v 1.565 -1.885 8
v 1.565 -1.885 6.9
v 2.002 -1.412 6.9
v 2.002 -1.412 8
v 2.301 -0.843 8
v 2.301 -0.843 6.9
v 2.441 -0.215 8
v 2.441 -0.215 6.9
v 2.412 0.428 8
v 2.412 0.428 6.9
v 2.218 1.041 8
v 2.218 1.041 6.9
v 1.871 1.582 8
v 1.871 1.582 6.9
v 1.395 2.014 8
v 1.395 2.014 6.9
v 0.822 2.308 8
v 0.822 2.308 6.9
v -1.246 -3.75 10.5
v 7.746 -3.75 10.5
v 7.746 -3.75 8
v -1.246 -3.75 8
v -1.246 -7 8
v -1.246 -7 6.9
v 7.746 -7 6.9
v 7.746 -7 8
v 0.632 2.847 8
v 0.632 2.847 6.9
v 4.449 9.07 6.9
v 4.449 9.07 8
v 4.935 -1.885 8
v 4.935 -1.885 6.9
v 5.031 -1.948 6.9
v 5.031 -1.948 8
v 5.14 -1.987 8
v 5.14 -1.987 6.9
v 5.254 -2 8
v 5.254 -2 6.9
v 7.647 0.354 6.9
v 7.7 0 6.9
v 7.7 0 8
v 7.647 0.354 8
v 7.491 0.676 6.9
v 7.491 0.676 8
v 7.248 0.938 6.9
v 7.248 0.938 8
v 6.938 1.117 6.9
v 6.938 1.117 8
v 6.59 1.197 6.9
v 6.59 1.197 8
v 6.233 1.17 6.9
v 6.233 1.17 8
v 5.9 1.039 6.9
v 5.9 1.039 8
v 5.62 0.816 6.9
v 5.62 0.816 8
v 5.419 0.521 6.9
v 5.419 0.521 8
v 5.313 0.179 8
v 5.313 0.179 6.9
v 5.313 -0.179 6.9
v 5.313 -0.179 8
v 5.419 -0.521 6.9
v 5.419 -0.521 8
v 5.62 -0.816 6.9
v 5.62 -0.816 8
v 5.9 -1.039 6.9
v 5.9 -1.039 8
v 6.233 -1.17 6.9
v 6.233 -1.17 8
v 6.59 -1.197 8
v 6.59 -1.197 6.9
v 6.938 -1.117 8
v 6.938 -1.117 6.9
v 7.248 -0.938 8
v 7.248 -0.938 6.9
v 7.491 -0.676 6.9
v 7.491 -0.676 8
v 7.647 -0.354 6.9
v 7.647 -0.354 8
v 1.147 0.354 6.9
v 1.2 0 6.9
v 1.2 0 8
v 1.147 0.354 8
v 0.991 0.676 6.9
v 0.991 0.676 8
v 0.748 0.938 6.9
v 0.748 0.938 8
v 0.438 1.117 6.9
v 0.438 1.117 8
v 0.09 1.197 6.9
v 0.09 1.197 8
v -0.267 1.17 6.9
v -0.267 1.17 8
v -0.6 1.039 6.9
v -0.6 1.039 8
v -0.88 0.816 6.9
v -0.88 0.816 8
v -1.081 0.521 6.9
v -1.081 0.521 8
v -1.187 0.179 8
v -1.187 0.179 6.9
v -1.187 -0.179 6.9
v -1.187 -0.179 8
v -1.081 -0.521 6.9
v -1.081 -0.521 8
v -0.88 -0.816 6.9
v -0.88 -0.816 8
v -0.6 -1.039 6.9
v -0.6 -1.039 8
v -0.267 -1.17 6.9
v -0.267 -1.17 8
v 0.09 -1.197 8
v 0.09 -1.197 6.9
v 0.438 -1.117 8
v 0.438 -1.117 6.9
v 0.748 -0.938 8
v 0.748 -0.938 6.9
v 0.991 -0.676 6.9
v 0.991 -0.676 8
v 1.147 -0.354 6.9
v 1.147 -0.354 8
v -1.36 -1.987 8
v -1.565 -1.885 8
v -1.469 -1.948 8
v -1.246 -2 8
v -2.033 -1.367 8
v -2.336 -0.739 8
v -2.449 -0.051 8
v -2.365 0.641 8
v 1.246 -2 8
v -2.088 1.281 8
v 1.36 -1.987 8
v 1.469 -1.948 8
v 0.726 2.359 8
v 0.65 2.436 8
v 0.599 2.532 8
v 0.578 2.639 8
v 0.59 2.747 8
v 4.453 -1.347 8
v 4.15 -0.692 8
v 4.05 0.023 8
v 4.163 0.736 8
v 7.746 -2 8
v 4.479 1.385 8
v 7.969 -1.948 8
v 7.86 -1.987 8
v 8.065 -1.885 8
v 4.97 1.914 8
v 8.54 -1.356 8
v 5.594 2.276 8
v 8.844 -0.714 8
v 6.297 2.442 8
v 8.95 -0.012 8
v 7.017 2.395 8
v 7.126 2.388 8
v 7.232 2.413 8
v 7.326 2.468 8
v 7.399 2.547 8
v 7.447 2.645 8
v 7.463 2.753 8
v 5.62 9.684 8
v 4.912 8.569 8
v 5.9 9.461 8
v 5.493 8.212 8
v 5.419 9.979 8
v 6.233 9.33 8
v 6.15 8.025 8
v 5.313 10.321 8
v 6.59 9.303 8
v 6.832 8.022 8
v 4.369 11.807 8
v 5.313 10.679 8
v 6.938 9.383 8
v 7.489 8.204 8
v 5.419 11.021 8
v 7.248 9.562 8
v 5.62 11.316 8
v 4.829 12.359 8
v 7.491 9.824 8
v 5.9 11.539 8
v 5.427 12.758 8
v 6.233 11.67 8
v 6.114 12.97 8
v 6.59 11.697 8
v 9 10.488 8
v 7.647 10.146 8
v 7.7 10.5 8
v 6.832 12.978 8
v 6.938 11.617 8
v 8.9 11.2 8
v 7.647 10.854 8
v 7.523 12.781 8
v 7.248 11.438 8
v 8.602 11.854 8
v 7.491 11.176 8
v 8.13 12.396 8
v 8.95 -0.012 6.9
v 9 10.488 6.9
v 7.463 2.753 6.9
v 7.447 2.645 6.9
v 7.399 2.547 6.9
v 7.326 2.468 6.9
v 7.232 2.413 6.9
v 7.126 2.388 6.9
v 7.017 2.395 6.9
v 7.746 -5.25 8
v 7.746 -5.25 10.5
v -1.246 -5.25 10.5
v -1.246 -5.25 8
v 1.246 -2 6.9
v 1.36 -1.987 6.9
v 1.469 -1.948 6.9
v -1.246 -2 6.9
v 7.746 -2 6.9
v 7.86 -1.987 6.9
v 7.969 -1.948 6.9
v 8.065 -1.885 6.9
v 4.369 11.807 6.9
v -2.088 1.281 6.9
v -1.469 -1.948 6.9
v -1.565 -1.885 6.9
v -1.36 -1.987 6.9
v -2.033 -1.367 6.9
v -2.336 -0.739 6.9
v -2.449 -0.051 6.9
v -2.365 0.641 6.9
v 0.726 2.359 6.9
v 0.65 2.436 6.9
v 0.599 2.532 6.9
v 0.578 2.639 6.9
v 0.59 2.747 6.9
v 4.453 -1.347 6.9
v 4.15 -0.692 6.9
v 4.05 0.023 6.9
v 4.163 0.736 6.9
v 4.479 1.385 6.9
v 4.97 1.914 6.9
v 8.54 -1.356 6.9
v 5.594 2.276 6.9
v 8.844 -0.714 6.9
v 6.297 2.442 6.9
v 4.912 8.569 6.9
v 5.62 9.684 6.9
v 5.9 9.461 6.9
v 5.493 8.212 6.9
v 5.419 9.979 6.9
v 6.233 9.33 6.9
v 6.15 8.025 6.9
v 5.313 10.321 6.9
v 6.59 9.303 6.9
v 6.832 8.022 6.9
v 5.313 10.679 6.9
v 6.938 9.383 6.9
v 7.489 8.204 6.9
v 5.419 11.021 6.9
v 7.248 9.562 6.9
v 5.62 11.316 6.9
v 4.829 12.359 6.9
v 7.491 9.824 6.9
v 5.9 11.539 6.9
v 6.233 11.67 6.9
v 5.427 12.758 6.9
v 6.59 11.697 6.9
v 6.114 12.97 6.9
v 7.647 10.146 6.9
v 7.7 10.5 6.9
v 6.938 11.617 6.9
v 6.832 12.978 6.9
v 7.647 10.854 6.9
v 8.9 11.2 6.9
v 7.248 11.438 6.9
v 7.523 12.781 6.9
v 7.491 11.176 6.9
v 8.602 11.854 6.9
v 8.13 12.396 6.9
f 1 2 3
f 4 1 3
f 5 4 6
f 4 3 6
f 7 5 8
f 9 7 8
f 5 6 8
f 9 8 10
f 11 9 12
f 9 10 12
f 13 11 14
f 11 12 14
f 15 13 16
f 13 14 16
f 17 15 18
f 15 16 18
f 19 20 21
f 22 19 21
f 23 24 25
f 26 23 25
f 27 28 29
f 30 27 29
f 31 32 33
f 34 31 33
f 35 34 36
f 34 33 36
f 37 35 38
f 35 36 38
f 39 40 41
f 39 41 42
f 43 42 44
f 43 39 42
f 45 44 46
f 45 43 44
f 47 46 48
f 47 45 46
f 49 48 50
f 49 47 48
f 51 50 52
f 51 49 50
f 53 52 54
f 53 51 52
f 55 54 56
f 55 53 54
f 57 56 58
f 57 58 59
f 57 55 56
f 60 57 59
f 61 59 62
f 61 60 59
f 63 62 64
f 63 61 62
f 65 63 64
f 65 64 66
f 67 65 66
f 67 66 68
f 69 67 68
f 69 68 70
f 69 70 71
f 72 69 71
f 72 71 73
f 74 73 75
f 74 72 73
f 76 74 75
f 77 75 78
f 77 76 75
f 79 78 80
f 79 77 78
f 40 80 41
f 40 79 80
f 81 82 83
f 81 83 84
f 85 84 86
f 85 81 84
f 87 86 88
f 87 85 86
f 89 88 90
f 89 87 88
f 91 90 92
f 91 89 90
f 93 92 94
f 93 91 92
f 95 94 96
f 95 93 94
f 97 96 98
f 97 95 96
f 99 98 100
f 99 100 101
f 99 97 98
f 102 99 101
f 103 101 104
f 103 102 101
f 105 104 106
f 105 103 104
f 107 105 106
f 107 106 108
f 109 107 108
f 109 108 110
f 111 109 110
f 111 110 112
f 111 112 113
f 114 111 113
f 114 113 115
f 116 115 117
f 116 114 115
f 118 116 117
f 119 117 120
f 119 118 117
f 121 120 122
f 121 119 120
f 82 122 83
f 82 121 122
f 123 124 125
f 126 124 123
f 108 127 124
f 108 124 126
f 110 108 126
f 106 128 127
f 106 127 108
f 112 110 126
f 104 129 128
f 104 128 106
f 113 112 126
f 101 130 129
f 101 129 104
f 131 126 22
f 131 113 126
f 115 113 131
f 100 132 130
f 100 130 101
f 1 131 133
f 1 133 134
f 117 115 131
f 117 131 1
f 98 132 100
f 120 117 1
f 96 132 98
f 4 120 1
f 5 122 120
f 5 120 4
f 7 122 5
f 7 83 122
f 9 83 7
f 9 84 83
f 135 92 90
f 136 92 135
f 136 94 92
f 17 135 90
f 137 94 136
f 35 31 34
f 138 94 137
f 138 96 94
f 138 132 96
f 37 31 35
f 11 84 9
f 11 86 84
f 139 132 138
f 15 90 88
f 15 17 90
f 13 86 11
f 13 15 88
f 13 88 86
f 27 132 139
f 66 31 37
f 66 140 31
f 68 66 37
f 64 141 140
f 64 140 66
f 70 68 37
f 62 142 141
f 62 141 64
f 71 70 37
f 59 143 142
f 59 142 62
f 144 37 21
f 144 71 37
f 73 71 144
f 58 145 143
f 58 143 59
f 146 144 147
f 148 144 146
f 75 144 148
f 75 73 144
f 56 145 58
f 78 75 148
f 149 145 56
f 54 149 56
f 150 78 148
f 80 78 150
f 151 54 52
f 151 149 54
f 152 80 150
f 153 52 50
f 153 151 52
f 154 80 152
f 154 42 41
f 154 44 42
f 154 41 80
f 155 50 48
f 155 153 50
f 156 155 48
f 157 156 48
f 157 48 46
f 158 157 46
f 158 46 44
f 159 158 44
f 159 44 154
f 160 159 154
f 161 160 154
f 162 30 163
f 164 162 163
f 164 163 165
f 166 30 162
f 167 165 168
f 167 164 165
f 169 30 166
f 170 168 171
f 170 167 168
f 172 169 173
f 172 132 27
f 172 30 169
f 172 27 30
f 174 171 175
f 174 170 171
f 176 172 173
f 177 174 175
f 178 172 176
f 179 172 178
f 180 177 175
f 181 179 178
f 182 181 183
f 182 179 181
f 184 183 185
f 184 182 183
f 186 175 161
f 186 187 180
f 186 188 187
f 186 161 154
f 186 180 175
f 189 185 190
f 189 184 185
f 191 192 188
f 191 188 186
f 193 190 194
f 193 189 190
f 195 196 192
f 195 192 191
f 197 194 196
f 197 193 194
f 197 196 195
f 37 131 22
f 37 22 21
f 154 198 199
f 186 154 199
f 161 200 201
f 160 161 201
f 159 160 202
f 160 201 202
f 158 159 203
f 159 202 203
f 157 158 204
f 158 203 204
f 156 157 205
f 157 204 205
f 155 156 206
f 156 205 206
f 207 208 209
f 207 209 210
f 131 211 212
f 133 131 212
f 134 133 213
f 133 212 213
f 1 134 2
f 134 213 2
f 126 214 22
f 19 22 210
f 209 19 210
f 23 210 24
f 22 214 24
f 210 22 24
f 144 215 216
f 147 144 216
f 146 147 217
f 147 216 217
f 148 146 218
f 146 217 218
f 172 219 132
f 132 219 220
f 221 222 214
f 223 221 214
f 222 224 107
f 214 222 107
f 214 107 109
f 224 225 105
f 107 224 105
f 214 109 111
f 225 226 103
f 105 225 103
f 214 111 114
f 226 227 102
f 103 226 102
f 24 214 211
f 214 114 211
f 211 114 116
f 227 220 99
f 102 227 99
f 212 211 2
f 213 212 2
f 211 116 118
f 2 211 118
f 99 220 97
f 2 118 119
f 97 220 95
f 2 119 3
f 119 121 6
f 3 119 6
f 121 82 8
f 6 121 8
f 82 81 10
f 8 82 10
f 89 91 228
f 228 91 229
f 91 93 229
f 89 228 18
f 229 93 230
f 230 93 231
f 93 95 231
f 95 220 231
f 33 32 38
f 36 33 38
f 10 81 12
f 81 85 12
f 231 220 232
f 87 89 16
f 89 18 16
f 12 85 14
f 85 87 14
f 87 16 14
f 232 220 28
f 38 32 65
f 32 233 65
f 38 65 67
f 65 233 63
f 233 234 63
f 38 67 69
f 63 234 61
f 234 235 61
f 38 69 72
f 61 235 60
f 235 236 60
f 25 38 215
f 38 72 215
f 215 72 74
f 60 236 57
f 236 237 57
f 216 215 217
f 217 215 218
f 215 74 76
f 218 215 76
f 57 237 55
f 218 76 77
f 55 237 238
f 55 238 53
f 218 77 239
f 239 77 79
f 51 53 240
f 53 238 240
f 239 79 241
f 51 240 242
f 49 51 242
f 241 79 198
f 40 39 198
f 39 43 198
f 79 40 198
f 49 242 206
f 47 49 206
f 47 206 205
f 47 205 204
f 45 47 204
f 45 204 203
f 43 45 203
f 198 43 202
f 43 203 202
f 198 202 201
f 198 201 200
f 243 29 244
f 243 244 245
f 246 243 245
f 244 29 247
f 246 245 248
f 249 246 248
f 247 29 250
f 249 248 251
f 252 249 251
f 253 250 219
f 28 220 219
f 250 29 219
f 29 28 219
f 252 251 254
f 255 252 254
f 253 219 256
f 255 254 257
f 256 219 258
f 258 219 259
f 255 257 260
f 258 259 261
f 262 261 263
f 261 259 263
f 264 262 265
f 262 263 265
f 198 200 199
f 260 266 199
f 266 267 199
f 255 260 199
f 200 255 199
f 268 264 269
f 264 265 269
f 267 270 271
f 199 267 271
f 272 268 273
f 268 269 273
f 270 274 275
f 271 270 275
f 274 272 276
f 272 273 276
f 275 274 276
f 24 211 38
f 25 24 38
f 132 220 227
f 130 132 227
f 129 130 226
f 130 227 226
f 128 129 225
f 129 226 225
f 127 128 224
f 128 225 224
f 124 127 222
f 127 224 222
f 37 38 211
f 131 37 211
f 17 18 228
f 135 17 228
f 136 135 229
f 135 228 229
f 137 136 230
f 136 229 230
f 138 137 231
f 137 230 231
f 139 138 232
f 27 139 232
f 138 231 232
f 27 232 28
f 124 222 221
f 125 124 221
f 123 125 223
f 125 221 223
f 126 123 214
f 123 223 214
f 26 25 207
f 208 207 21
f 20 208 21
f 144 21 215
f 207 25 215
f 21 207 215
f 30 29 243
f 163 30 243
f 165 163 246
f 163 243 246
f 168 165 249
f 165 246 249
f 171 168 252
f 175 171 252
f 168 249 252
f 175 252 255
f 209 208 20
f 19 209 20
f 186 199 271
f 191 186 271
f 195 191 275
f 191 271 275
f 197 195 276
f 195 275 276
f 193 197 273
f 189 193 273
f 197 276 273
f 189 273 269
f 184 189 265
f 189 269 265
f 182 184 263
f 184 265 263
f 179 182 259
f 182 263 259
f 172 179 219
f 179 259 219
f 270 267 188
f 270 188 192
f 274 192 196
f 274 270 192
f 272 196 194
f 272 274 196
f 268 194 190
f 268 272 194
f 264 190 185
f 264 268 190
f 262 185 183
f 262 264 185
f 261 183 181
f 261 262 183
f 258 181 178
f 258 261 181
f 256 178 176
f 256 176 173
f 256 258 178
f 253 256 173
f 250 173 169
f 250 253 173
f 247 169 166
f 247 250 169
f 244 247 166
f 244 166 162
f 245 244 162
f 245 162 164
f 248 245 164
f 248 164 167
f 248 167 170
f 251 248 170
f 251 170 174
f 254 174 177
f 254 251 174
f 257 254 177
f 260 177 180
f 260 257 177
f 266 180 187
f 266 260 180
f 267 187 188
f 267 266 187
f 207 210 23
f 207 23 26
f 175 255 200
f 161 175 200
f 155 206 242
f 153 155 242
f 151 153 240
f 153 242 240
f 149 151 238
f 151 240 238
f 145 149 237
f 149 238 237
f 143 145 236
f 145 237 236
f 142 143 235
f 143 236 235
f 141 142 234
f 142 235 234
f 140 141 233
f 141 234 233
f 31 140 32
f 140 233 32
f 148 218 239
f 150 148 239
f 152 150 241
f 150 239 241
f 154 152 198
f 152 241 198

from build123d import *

# Parameters (mm, degrees)
STOCK_BASE_SKEWED_1_START     = 6.9
STOCK_BASE_SKEWED_1_OUTLINE_R = 1.2
STOCK_BASE_SKEWED_1_DEPTH     = 1.1
SKETCH1_W                     = 2.5
SKETCH1_H                     = 1.5
BOSS_EXTRUDE1_DEPTH           = 8.991987159


# Read off the part's stored shape, not the designer's step: Stock-Base_skewed-1
with BuildPart() as part:
    # Stock-Base_skewed-1 outline → Stock-Base_skewed-1 (new body)
    with BuildSketch(Plane.XY.offset(STOCK_BASE_SKEWED_1_START)):
        with BuildLine():
            ThreePointArc((8.999971655, 10.488095238), (7.184905048, 12.904351279), (4.369026688, 11.807269193))
            Line((4.369026688, 11.807269193), (-2.088353846, 1.281123809))
            ThreePointArc((-2.088353846, 1.281123809), (-2.417250501, -0.399249317), (-1.565479113, -1.884615385))
            ThreePointArc((-1.565479113, -1.884615385), (-1.415835135, -1.970269972), (-1.245993579, -2))
            Line((-1.245993579, -2), (-1.245993579, -7))
            Line((-1.245993579, -7), (7.745993579, -7))
            Line((7.745993579, -7), (7.745993579, -2))
            ThreePointArc((7.745993579, -2), (7.915835135, -1.970269972), (8.065479113, -1.884615385))
            ThreePointArc((8.065479113, -1.884615385), (8.715388585, -1.046209071), (8.949972222, -0.011666667))
            Line((8.949972222, -0.011666667), (8.999971655, 10.488095238))
        make_face()
        Circle(STOCK_BASE_SKEWED_1_OUTLINE_R, mode=Mode.SUBTRACT)
        with Locations((6.5, 0)):
            Circle(STOCK_BASE_SKEWED_1_OUTLINE_R, mode=Mode.SUBTRACT)
        with BuildLine():
            Line((0.632085047, 2.847123137), (4.449478669, 9.069838376))
            ThreePointArc((4.449478669, 9.069838376), (5.815094952, 8.095648721), (7.489077768, 8.203976226))
            Line((7.489077768, 8.203976226), (7.463119607, 2.75282442))
            ThreePointArc((7.463119607, 2.75282442), (7.325518036, 2.467571215), (7.017292273, 2.394766941))
            ThreePointArc((7.017292273, 2.394766941), (4.297058288, 1.072169676), (4.934520887, -1.884615385))
            ThreePointArc((4.934520887, -1.884615385), (5.084164865, -1.970269972), (5.254006421, -2))
            Line((5.254006421, -2), (1.245993579, -2))
            ThreePointArc((1.245993579, -2), (1.415835135, -1.970269972), (1.565479113, -1.884615385))
            ThreePointArc((1.565479113, -1.884615385), (2.412392059, 0.427626653), (0.822306837, 2.307880297))
            ThreePointArc((0.822306837, 2.307880297), (0.598713954, 2.532178772), (0.632085047, 2.847123137))
        make_face(mode=Mode.SUBTRACT)
        with Locations((6.5, 10.5)):
            Circle(STOCK_BASE_SKEWED_1_OUTLINE_R, mode=Mode.SUBTRACT)
    extrude(amount=STOCK_BASE_SKEWED_1_DEPTH)

    # Sketch1 → Boss-Extrude1 (add)
    with BuildSketch(Plane(origin=(7.745993579, 0, 0), x_dir=(0, 0, -1), z_dir=(1, 0, 0))):
        with Locations((-9.25, -4.5)):
            Rectangle(SKETCH1_W, SKETCH1_H)
    extrude(amount=-BOSS_EXTRUDE1_DEPTH)


solid = part.part
